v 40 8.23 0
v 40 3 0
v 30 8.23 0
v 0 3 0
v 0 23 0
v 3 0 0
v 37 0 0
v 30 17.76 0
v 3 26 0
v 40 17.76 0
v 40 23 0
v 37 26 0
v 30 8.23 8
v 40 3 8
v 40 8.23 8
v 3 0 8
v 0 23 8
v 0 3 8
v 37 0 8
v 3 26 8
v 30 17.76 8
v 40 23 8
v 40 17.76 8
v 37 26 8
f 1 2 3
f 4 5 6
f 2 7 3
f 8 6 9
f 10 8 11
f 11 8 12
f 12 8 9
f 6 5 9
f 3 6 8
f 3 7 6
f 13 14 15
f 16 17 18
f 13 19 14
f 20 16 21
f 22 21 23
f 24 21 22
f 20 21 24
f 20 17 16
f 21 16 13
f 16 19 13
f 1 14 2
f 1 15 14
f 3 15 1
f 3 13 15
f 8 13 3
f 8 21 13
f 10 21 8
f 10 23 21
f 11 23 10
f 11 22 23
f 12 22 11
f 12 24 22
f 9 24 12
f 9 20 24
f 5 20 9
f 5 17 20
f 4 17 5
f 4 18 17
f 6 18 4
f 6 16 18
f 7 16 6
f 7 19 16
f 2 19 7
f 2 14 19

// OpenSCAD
$fn = 32;

// ----------------------------------------------------------------------
// C washer: 40 x 26 mm plate with an open slot
// ----------------------------------------------------------------------

// --- parameters (mm) ---
profile_height = 8;       // extrusion height
profile_points = 12;      // points of the closed outline

profile = [[3, 0], [37, 0], [40, 3], [40, 8.23], [30, 8.23], [30, 17.76], [40, 17.76], [40, 23], [37, 26], [3, 26], [0, 23], [0, 3]];  // single closed polygon, 12 points, counter clockwise

// --- the one profile operation ---
linear_extrude(height = profile_height) polygon(points = profile);
